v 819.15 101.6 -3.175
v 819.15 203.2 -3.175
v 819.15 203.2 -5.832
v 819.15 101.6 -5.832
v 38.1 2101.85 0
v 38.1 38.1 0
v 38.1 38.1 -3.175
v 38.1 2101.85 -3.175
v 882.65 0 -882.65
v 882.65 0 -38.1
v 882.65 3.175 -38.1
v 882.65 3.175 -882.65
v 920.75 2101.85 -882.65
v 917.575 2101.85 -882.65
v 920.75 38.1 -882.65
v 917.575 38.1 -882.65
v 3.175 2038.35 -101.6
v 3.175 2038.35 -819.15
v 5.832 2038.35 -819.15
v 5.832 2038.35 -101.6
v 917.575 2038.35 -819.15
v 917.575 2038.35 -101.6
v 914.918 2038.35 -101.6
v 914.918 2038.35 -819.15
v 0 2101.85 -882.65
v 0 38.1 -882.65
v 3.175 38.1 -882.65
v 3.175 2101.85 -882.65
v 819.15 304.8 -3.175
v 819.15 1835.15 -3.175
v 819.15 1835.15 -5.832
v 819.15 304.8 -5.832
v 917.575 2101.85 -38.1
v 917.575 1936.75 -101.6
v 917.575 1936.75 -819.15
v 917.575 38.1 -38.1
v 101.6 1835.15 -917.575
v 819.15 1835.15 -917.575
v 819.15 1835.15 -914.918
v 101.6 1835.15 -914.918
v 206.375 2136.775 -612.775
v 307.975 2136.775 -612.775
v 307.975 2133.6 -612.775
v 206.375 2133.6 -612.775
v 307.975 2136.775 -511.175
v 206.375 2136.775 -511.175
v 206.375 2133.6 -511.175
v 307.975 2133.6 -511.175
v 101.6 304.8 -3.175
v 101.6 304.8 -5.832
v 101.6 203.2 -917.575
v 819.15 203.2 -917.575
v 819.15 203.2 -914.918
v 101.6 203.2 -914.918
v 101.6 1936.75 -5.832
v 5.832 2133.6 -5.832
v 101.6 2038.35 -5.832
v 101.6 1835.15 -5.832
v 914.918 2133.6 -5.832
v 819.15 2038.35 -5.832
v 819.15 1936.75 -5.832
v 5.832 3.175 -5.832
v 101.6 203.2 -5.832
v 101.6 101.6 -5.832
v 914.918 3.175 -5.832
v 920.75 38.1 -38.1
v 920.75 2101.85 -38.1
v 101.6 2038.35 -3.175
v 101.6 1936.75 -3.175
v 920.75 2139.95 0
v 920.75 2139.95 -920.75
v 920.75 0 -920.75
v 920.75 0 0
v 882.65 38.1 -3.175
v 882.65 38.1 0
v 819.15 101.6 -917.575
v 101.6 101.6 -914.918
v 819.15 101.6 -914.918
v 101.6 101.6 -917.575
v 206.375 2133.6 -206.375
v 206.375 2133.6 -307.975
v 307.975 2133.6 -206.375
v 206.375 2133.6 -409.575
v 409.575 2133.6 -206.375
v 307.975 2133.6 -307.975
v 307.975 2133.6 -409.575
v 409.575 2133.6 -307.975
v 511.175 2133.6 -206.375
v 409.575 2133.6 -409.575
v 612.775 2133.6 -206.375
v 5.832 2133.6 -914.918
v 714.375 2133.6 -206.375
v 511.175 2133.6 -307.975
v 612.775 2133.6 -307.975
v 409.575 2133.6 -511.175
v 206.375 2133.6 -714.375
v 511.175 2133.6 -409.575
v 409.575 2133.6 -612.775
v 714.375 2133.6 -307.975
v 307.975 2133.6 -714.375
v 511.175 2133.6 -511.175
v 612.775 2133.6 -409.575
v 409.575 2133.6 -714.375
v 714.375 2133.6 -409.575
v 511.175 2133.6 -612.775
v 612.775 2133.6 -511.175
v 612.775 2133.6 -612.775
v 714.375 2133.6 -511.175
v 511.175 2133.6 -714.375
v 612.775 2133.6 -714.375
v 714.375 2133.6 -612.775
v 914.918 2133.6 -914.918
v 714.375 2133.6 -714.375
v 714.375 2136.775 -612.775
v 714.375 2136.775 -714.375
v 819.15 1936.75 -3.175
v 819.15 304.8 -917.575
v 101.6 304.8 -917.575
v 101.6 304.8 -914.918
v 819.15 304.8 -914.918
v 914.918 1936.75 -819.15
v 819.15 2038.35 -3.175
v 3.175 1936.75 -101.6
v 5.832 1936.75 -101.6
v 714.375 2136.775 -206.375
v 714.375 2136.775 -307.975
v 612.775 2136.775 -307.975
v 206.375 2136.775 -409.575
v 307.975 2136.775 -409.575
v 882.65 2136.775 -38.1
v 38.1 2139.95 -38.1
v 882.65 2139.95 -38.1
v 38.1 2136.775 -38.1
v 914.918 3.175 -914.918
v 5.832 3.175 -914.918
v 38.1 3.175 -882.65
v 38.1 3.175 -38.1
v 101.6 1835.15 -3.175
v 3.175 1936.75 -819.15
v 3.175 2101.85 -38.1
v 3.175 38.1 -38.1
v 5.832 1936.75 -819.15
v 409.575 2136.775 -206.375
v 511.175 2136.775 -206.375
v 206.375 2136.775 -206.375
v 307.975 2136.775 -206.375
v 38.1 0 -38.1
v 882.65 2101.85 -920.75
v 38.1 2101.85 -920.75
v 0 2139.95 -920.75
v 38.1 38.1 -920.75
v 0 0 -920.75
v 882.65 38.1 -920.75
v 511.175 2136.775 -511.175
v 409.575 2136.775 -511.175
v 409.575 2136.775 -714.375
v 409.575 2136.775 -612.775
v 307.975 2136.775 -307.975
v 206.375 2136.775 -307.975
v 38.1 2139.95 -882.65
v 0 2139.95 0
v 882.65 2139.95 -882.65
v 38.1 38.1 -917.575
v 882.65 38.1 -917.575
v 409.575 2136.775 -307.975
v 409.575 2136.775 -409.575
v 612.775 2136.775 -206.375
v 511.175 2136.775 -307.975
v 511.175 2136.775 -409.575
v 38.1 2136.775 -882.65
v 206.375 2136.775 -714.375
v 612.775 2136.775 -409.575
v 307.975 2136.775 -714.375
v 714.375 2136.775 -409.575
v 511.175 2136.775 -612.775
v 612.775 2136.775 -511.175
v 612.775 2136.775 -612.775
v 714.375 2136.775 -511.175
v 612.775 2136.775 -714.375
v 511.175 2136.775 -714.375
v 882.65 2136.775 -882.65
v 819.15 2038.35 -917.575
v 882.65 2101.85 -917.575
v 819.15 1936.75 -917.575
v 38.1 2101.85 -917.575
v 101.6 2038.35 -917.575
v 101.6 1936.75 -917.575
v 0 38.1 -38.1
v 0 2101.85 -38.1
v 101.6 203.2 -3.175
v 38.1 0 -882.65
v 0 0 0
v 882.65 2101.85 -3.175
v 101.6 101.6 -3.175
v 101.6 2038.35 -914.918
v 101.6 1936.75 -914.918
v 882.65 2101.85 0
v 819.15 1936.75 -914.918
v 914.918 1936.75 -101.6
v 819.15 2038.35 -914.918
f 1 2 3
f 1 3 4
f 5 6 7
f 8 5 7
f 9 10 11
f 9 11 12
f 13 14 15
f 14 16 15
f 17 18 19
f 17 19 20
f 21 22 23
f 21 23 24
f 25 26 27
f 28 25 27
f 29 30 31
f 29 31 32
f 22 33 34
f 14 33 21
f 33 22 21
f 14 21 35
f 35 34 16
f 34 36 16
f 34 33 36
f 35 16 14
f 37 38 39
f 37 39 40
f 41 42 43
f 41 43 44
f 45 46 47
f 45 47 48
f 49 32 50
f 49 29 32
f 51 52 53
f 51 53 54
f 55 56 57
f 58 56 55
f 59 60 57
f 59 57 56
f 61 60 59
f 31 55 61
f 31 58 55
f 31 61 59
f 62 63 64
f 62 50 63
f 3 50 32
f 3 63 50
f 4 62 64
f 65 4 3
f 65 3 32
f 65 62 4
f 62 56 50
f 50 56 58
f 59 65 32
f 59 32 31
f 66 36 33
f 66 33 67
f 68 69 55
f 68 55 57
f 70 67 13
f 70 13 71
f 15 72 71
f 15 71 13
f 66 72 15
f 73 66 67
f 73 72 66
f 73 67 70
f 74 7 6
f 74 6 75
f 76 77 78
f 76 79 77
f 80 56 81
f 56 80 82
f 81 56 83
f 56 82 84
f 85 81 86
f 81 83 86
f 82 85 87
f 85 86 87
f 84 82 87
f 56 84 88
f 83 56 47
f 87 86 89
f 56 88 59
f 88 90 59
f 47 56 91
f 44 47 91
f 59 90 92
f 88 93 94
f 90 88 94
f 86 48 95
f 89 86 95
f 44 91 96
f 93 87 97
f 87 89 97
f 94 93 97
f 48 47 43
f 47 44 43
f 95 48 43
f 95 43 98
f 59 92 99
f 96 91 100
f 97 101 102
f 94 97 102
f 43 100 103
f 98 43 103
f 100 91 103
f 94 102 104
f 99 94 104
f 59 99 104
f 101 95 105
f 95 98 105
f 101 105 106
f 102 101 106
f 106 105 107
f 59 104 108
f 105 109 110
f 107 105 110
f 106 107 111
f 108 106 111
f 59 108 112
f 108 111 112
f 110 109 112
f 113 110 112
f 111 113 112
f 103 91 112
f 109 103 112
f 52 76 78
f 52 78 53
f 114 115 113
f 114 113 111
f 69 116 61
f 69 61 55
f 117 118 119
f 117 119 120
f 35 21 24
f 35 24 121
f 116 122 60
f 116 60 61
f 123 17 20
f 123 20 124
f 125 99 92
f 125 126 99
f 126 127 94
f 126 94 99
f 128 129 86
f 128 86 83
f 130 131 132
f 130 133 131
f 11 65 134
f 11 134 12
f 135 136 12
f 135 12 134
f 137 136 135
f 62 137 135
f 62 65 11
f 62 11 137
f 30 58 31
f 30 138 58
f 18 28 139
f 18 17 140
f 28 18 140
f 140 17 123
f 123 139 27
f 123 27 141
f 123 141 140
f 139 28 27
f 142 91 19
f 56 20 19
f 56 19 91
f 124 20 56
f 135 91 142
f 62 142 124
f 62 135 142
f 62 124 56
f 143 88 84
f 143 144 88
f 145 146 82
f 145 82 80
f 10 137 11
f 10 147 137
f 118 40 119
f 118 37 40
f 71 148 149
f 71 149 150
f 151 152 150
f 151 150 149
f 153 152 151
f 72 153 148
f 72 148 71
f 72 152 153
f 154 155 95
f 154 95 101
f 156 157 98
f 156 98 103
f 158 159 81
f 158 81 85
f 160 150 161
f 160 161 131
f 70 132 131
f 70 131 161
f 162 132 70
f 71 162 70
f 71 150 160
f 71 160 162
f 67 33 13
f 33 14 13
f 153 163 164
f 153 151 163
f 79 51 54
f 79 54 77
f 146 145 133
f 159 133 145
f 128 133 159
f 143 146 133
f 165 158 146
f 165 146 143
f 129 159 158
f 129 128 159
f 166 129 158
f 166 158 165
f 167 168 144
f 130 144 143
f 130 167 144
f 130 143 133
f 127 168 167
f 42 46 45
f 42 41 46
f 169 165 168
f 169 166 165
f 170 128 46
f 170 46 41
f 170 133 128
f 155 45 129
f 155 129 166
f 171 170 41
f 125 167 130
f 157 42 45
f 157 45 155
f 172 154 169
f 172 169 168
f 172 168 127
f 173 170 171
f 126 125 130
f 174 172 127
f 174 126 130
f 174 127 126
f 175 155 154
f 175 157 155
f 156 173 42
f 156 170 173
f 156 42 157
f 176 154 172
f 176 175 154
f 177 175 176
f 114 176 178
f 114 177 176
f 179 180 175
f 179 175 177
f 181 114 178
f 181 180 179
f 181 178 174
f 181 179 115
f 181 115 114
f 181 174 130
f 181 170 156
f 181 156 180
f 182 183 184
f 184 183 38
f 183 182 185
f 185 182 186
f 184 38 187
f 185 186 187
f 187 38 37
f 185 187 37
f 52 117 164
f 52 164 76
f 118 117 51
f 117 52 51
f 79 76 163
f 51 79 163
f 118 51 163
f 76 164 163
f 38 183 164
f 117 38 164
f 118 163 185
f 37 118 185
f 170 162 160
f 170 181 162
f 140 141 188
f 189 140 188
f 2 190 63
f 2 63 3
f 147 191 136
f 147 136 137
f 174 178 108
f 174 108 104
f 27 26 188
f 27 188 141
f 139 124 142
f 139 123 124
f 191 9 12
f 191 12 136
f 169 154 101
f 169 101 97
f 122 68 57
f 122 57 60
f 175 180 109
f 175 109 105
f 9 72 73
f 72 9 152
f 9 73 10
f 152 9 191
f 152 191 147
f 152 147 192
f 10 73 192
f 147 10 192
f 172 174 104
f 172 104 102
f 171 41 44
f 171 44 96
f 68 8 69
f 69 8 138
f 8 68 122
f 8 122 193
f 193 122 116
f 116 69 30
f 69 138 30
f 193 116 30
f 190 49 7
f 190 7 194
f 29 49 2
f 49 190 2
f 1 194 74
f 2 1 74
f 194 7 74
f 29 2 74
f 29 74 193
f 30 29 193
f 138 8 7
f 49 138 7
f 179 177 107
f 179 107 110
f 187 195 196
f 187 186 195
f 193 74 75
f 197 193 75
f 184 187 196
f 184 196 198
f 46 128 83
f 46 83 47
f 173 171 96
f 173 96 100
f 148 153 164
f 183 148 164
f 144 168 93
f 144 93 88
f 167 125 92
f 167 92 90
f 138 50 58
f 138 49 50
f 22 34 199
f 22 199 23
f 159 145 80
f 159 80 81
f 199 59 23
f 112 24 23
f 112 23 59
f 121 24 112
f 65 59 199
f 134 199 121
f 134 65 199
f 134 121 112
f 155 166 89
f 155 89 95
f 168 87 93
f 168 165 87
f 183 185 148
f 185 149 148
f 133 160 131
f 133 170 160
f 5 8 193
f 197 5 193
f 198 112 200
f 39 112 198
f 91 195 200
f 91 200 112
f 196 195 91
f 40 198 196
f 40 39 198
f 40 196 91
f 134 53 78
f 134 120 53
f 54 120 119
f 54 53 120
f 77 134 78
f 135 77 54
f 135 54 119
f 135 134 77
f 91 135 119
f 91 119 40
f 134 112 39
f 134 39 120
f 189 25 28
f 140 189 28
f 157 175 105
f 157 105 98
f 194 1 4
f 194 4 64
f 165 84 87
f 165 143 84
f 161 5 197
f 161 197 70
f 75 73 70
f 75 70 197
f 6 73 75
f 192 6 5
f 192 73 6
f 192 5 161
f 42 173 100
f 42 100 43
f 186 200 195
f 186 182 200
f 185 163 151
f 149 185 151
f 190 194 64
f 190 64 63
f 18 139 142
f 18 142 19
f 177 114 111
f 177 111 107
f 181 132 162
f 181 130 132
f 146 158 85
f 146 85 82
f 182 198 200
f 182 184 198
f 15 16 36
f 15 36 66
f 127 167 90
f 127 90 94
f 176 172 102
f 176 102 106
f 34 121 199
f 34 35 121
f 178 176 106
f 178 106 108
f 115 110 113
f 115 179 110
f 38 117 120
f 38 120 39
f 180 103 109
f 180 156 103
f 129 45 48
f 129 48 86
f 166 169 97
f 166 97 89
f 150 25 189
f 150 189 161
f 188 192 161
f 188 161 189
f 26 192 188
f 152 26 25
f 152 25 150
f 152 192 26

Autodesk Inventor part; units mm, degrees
ref_plane "YZ Plane" through (0, 0, 0) normal (1, 0, 0) x (0, 1, 0)
ref_plane "XZ Plane" through (0, 0, 0) normal (0, 1, 0) x (-1, 0, 0)
ref_plane "XY Plane" through (0, 0, 0) normal (0, 0, 1) x (1, 0, 0)
sketch "Sketch1" plane through (0, 0, 0) normal (0, 1, 0) x (-1, 0, 0)
  line L0 (0, 0) -> (-920.75, 0)
  line L1 (-920.75, 0) -> (-920.75, -920.75)
  line L2 (-920.75, -920.75) -> (0, -920.75)
  line L3 (0, -920.75) -> (0, 0)
  line L4 (-38.1, -38.1) -> (-882.65, -38.1)
  line L5 (-882.65, -38.1) -> (-882.65, -882.65)
  line L6 (-882.65, -882.65) -> (-38.1, -882.65)
  line L7 (-38.1, -882.65) -> (-38.1, -38.1)
  dimension "d0" = 920.75
  dimension "d3" = 920.75
  dimension "d4" = 38.1
  dimension "d5" = 38.1
  dimension "d6" = 38.1
  dimension "d7" = 38.1
extrude "Extrusion1" add sketch "Sketch1" along normal blind 3.175
sketch "Sketch2" plane through (0, 3.175, 0) normal (0, 1, 0) x (1, 0, 0)
  line L0 (0, 0) -> (920.75, 0) projected
  line L1 (920.75, 0) -> (920.75, 920.75) projected
  line L2 (920.75, 920.75) -> (0, 920.75) projected
  line L3 (0, 0) -> (920.75, 0)
  line L4 (920.75, 0) -> (920.75, 920.75)
  line L5 (920.75, 920.75) -> (0, 920.75)
  line L6 (0, 920.75) -> (0, 0)
  line L7 (3.175, 3.175) -> (917.575, 3.175)
  line L8 (917.575, 3.175) -> (917.575, 917.575)
  line L9 (917.575, 917.575) -> (3.175, 917.575)
  line L10 (3.175, 917.575) -> (3.175, 3.175)
  dimension "d10" = 3.175
  dimension "d12" = 3.175
  dimension "d13" = 3.175
  dimension "d14" = 3.175
extrude "Extrusion2" add sketch "Sketch2" along normal blind 34.925
sketch "Sketch3" plane through (0, 38.1, 0) normal (0, 1, 0) x (1, 0, 0)
  line L0 (3.175, 3.175) -> (3.175, 917.575) projected
  line L1 (917.575, 917.575) -> (917.575, 3.175) projected
  line L2 (917.575, 3.175) -> (3.175, 3.175) projected
  line L3 (0, 0) -> (920.75, 0) projected
  line L4 (920.75, 0) -> (920.75, 920.75) projected
  line L5 (0, 920.75) -> (0, 0) projected
  line L6 (0, 0) -> (38.1, 0)
  line L7 (38.1, 3.175) -> (3.175, 3.175)
  line L8 (3.175, 38.1) -> (0, 38.1)
  line L9 (38.1, 0) -> (38.1, 3.175)
  line L10 (920.75, 0) -> (920.75, 38.1)
  line L11 (917.575, 38.1) -> (917.575, 3.175)
  line L12 (882.65, 3.175) -> (882.65, 0)
  line L13 (917.575, 38.1) -> (920.75, 38.1)
  dimension "d17" = 38.1
  dimension "d18" = 38.1
  dimension "d19" = 38.1
  dimension "d20" = 38.1
  dimension "d21" = 38.1
  dimension "d22" = 38.1
extrude "Extrusion3" add sketch "Sketch3" along normal blind 2063.75 contours L2 L9 L3 L5 L8 L0 | L2 L1 L13 L4 L3 L12
sketch "Sketch4" plane through (0, 38.1, 0) normal (0, 1, 0) x (1, 0, 0)
  line L0 (3.175, 38.1) -> (3.175, 917.575) projected
  line L1 (3.175, 917.575) -> (917.575, 917.575) projected
  line L2 (917.575, 917.575) -> (917.575, 38.1) projected
  line L3 (920.75, 38.1) -> (920.75, 920.75) projected
  line L4 (920.75, 920.75) -> (0, 920.75) projected
  line L5 (0, 920.75) -> (0, 38.1) projected
  line L6 (0, 920.75) -> (0, 882.65)
  line L7 (3.175, 882.65) -> (3.175, 917.575)
  line L8 (38.1, 917.575) -> (38.1, 920.75)
  line L9 (0, 882.65) -> (3.175, 882.65)
  line L10 (920.75, 920.75) -> (882.65, 920.75)
  line L11 (882.65, 917.575) -> (917.575, 917.575)
  line L12 (917.575, 882.65) -> (920.75, 882.65)
  line L13 (882.65, 920.75) -> (882.65, 917.575)
  point P0 (0, 0)
  dimension "d25" = 38.1
  dimension "d26" = 38.1
  dimension "d27" = 38.1
  dimension "d28" = 38.1
extrude "Extrusion4" add sketch "Sketch4" along normal blind 2063.75 contours L9 L5 L4 L8 L1 L0 | L13 L4 L3 L12 L2 L1
sketch "Sketch5" plane through (0, 3.175, 0) normal (0, 1, 0) x (1, 0, 0)
  line L0 (3.175, 3.175) -> (917.575, 3.175) projected
  line L1 (3.175, 3.175) -> (917.575, 3.175)
  line L2 (917.575, 3.175) -> (917.575, 917.575)
  line L3 (917.575, 917.575) -> (3.175, 917.575)
  line L4 (3.175, 917.575) -> (3.175, 3.175)
  line L5 (5.8318, 5.8318) -> (914.9182, 5.8318)
  line L6 (914.9182, 5.8318) -> (914.9182, 914.9182)
  line L7 (914.9182, 914.9182) -> (5.8318, 914.9182)
  line L8 (5.8318, 914.9182) -> (5.8318, 5.8318)
  point P0 (0, 0)
  dimension "d31" = 914.4
  dimension "d33" = 914.4
  dimension "d34" = 2.6568
  dimension "d35" = 2.6568
  dimension "d36" = 909.0863
  dimension "d37" = 909.0863
extrude "Extrusion5" add sketch "Sketch5" along normal blind 2133.6
sketch "Sketch6" plane through (0, 2101.85, 0) normal (0, 1, 0) x (1, 0, 0)
  line L0 (920.75, 0) -> (0, 0)
  line L1 (0, 0) -> (0, 920.75)
  line L2 (0, 920.75) -> (920.75, 920.75)
  line L3 (920.75, 920.75) -> (920.75, 0)
  line L4 (917.575, 3.175) -> (3.175, 3.175)
  line L5 (3.175, 3.175) -> (3.175, 917.575)
  line L6 (3.175, 917.575) -> (917.575, 917.575)
  line L7 (917.575, 917.575) -> (917.575, 3.175)
  point P0 (0, 0)
  dimension "d40" = 920.75
  dimension "d42" = 920.75
  dimension "d43" = 914.4
  dimension "d44" = 914.4
extrude "Extrusion6" add sketch "Sketch6" along normal blind 38.1
sketch "Sketch7" plane through (0, 2136.775, 0) normal (0, 1, 0) x (1, 0, 0)
  line L0 (5.8318, 5.8318) -> (5.8318, 914.9182) projected
  line L1 (5.8318, 914.9182) -> (914.9182, 914.9182) projected
  line L2 (914.9182, 914.9182) -> (914.9182, 5.8318) projected
  line L3 (914.9182, 5.8318) -> (5.8318, 5.8318) projected
  line L4 (5.8318, 5.8318) -> (914.9182, 5.8318)
  line L5 (914.9182, 5.8318) -> (914.9182, 914.9182)
  line L6 (914.9182, 914.9182) -> (5.8318, 914.9182)
  line L7 (5.8318, 914.9182) -> (5.8318, 5.8318)
  point P0 (0, 0)
  dimension "d47" = 909.0863
  dimension "d49" = 909.0863
extrude "Extrusion7" add sketch "Sketch7" against normal blind 3.175
sketch "Sketch8" plane through (0, 2136.775, 0) normal (0, 1, 0) x (1, 0, 0)
  line L0 (3.175, 3.175) -> (917.575, 3.175) projected
  line L1 (917.575, 3.175) -> (917.575, 917.575) projected
  line L2 (917.575, 917.575) -> (3.175, 917.575) projected
  line L3 (3.175, 917.575) -> (3.175, 3.175) projected
  line L4 (3.175, 3.175) -> (917.575, 3.175)
  line L5 (917.575, 3.175) -> (917.575, 917.575)
  line L6 (917.575, 917.575) -> (3.175, 917.575)
  line L7 (3.175, 917.575) -> (3.175, 3.175)
  line L8 (38.1, 38.1) -> (882.65, 38.1)
  line L9 (882.65, 38.1) -> (882.65, 882.65)
  line L10 (882.65, 882.65) -> (38.1, 882.65)
  line L11 (38.1, 882.65) -> (38.1, 38.1)
  point P0 (0, 0)
  dimension "d52" = 914.4
  dimension "d54" = 914.4
  dimension "d55" = 34.925
  dimension "d56" = 34.925
  dimension "d57" = 844.55
  dimension "d58" = 844.55
extrude "Extrusion8" add sketch "Sketch8" along normal blind 3.175
sketch "Sketch9" plane through (38.1, 38.1, -3.175) normal (0, 0, 1) x (1, 0, 0)
  line L0 (844.55, 2063.75) -> (0, 2063.75) projected
  line L1 (0, 0) -> (0, 2063.75) projected
  line L2 (844.55, 0) -> (0, 0) projected
  line L3 (844.55, 0) -> (844.55, 2063.75) projected
  line L4 (63.5, 2000.25) -> (781.05, 2000.25)
  line L5 (781.05, 2000.25) -> (781.05, 1898.65)
  line L6 (781.05, 1898.65) -> (63.5, 1898.65)
  line L7 (63.5, 1898.65) -> (63.5, 2000.25)
  line L8 (63.5, 1797.05) -> (781.05, 1797.05)
  line L9 (781.05, 1797.05) -> (781.05, 266.7)
  line L10 (781.05, 266.7) -> (63.5, 266.7)
  line L11 (63.5, 266.7) -> (63.5, 1797.05)
  line L12 (63.5, 165.1) -> (781.05, 165.1)
  line L13 (781.05, 165.1) -> (781.05, 63.5)
  line L14 (781.05, 63.5) -> (63.5, 63.5)
  line L15 (63.5, 63.5) -> (63.5, 165.1)
  point P0 (-38.1, -38.1)
  dimension "d61" = 63.5
  dimension "d62" = 0
  dimension "d63" = 0
  dimension "d64" = 63.5
  dimension "d65" = 101.6
  dimension "d66" = 63.5
  dimension "d67" = 101.6
  dimension "d68" = 101.6
  dimension "d69" = 101.6
  dimension "d70" = 63.5
  dimension "d71" = 0
  dimension "d72" = 0
extrude "Extrusion9" cut sketch "Sketch9" against normal blind 2.6568 contours L4 L5 L6 L7 | L8 L9 L10 L11 | L12 L13 L14 L15
sketch "Sketch10" plane through (882.65, 38.1, -917.575) normal (0, 0, -1) x (-1, 0, 0)
  line L0 (844.55, 2063.75) -> (0, 2063.75) projected
  line L1 (0, 0) -> (0, 2063.75) projected
  line L2 (844.55, 0) -> (0, 0) projected
  line L3 (844.55, 0) -> (844.55, 2063.75) projected
  line L4 (63.5, 2000.25) -> (781.05, 2000.25)
  line L5 (781.05, 2000.25) -> (781.05, 1898.65)
  line L6 (781.05, 1898.65) -> (63.5, 1898.65)
  line L7 (63.5, 1898.65) -> (63.5, 2000.25)
  line L8 (63.5, 1797.05) -> (781.05, 1797.05)
  line L9 (781.05, 1797.05) -> (781.05, 266.7)
  line L10 (781.05, 266.7) -> (63.5, 266.7)
  line L11 (63.5, 266.7) -> (63.5, 1797.05)
  line L12 (63.5, 165.1) -> (781.05, 165.1)
  line L13 (781.05, 165.1) -> (781.05, 63.5)
  line L14 (781.05, 63.5) -> (63.5, 63.5)
  line L15 (63.5, 63.5) -> (63.5, 165.1)
  point P0 (882.65, -38.1)
  dimension "d75" = 63.5
  dimension "d76" = 63.5
  dimension "d77" = 63.5
  dimension "d78" = 101.6
  dimension "d79" = 101.6
  dimension "d80" = 0
  dimension "d81" = 0
  dimension "d82" = 101.6
  dimension "d83" = 101.6
  dimension "d84" = 63.5
  dimension "d85" = 0
  dimension "d86" = 0
extrude "Extrusion10" cut sketch "Sketch10" against normal blind 2.6568 contours L4 L5 L6 L7 | L8 L9 L10 L11 | L12 L13 L14 L15
sketch "Sketch11" plane through (917.575, 38.1, -38.1) normal (1, 0, 0) x (0, 0, -1)
  line L0 (844.55, 2063.75) -> (0, 2063.75) projected
  line L1 (0, 0) -> (0, 2063.75) projected
  line L2 (844.55, 0) -> (844.55, 2063.75) projected
  line L3 (63.5, 2000.25) -> (781.05, 2000.25)
  line L4 (781.05, 2000.25) -> (781.05, 1898.65)
  line L5 (781.05, 1898.65) -> (63.5, 1898.65)
  line L6 (63.5, 1898.65) -> (63.5, 2000.25)
  point P0 (-38.1, -38.1)
  dimension "d89" = 63.5
  dimension "d90" = 63.5
  dimension "d91" = 63.5
  dimension "d92" = 101.6
extrude "Extrusion11" cut sketch "Sketch11" against normal blind 2.6568
sketch "Sketch12" plane through (3.175, 38.1, -882.65) normal (-1, 0, 0) x (0, 0, 1)
  line L0 (844.55, 2063.75) -> (0, 2063.75) projected
  line L1 (0, 0) -> (0, 2063.75) projected
  line L2 (844.55, 0) -> (844.55, 2063.75) projected
  line L3 (63.5, 2000.25) -> (781.05, 2000.25)
  line L4 (781.05, 2000.25) -> (781.05, 1898.65)
  line L5 (781.05, 1898.65) -> (63.5, 1898.65)
  line L6 (63.5, 1898.65) -> (63.5, 2000.25)
  point P0 (882.65, -38.1)
  dimension "d95" = 63.5
  dimension "d96" = 63.5
  dimension "d97" = 63.5
  dimension "d98" = 101.6
extrude "Extrusion12" cut sketch "Sketch12" against normal blind 2.6568
sketch "Sketch13" plane through (0, 2136.775, 0) normal (0, 1, 0) x (1, 0, 0)
  line L0 (920.75, 920.75) -> (0, 920.75) projected
  line L1 (0, 920.75) -> (0, 0) projected
  line L2 (409.575, 511.175) -> (511.175, 511.175)
  line L3 (511.175, 511.175) -> (511.175, 409.575)
  line L4 (511.175, 409.575) -> (409.575, 409.575)
  line L5 (409.575, 409.575) -> (409.575, 511.175)
  line L6 (0, 0) -> (920.75, 0) projected
  line L7 (612.775, 511.175) -> (714.375, 511.175)
  line L8 (714.375, 511.175) -> (714.375, 409.575)
  line L9 (714.375, 409.575) -> (612.775, 409.575)
  line L10 (612.775, 409.575) -> (612.775, 511.175)
  line L11 (206.375, 511.175) -> (307.975, 511.175)
  line L12 (307.975, 511.175) -> (307.975, 409.575)
  line L13 (307.975, 409.575) -> (206.375, 409.575)
  line L14 (206.375, 409.575) -> (206.375, 511.175)
  line L15 (409.575, 714.375) -> (511.175, 714.375)
  line L16 (511.175, 714.375) -> (511.175, 612.775)
  line L17 (511.175, 612.775) -> (409.575, 612.775)
  line L18 (409.575, 612.775) -> (409.575, 714.375)
  line L19 (612.775, 714.375) -> (714.375, 714.375)
  line L20 (714.375, 714.375) -> (714.375, 612.775)
  line L21 (714.375, 612.775) -> (612.775, 612.775)
  line L22 (612.775, 612.775) -> (612.775, 714.375)
  line L23 (206.375, 714.375) -> (307.975, 714.375)
  line L24 (307.975, 714.375) -> (307.975, 612.775)
  line L25 (307.975, 612.775) -> (206.375, 612.775)
  line L26 (206.375, 612.775) -> (206.375, 714.375)
  line L27 (409.575, 307.975) -> (511.175, 307.975)
  line L28 (511.175, 307.975) -> (511.175, 206.375)
  line L29 (511.175, 206.375) -> (409.575, 206.375)
  line L30 (409.575, 206.375) -> (409.575, 307.975)
  line L31 (612.775, 307.975) -> (714.375, 307.975)
  line L32 (714.375, 307.975) -> (714.375, 206.375)
  line L33 (714.375, 206.375) -> (612.775, 206.375)
  line L34 (612.775, 206.375) -> (612.775, 307.975)
  line L35 (206.375, 307.975) -> (307.975, 307.975)
  line L36 (307.975, 307.975) -> (307.975, 206.375)
  line L37 (307.975, 206.375) -> (206.375, 206.375)
  line L38 (206.375, 206.375) -> (206.375, 307.975)
  dimension "d150" = 409.575
  dimension "d151" = 101.6
  dimension "d152" = 409.575
  dimension "d153" = 101.6
  dimension "d154" = 101.6
  dimension "d155" = 101.6
  dimension "d156" = 101.6
  dimension "d157" = 101.6
  dimension "d158" = 101.6
  dimension "d159" = 101.6
  dimension "d160" = 101.6
  dimension "d161" = 101.6
  dimension "d162" = 101.6
  dimension "d163" = 101.6
  dimension "d164" = 101.6
  dimension "d165" = 101.6
  dimension "d166" = 101.6
  dimension "d167" = 101.6
  dimension "d168" = 101.6
  dimension "d169" = 101.6
  dimension "d170" = 101.6
  dimension "d171" = 101.6
  dimension "d172" = 101.6
  dimension "d173" = 101.6
  dimension "d174" = 101.6
  dimension "d175" = 101.6
  dimension "d176" = 101.6
  dimension "d177" = 101.6
  dimension "d178" = 101.6
  dimension "d179" = 101.6
  dimension "d180" = 101.6
  dimension "d181" = 101.6
  dimension "d182" = 101.6
  dimension "d183" = 101.6
  dimension "d184" = 101.6
  dimension "d185" = 101.6
extrude "Extrusion13" cut sketch "Sketch13" against normal blind 3.175
properties part number "Cabinet_3x3x7"
